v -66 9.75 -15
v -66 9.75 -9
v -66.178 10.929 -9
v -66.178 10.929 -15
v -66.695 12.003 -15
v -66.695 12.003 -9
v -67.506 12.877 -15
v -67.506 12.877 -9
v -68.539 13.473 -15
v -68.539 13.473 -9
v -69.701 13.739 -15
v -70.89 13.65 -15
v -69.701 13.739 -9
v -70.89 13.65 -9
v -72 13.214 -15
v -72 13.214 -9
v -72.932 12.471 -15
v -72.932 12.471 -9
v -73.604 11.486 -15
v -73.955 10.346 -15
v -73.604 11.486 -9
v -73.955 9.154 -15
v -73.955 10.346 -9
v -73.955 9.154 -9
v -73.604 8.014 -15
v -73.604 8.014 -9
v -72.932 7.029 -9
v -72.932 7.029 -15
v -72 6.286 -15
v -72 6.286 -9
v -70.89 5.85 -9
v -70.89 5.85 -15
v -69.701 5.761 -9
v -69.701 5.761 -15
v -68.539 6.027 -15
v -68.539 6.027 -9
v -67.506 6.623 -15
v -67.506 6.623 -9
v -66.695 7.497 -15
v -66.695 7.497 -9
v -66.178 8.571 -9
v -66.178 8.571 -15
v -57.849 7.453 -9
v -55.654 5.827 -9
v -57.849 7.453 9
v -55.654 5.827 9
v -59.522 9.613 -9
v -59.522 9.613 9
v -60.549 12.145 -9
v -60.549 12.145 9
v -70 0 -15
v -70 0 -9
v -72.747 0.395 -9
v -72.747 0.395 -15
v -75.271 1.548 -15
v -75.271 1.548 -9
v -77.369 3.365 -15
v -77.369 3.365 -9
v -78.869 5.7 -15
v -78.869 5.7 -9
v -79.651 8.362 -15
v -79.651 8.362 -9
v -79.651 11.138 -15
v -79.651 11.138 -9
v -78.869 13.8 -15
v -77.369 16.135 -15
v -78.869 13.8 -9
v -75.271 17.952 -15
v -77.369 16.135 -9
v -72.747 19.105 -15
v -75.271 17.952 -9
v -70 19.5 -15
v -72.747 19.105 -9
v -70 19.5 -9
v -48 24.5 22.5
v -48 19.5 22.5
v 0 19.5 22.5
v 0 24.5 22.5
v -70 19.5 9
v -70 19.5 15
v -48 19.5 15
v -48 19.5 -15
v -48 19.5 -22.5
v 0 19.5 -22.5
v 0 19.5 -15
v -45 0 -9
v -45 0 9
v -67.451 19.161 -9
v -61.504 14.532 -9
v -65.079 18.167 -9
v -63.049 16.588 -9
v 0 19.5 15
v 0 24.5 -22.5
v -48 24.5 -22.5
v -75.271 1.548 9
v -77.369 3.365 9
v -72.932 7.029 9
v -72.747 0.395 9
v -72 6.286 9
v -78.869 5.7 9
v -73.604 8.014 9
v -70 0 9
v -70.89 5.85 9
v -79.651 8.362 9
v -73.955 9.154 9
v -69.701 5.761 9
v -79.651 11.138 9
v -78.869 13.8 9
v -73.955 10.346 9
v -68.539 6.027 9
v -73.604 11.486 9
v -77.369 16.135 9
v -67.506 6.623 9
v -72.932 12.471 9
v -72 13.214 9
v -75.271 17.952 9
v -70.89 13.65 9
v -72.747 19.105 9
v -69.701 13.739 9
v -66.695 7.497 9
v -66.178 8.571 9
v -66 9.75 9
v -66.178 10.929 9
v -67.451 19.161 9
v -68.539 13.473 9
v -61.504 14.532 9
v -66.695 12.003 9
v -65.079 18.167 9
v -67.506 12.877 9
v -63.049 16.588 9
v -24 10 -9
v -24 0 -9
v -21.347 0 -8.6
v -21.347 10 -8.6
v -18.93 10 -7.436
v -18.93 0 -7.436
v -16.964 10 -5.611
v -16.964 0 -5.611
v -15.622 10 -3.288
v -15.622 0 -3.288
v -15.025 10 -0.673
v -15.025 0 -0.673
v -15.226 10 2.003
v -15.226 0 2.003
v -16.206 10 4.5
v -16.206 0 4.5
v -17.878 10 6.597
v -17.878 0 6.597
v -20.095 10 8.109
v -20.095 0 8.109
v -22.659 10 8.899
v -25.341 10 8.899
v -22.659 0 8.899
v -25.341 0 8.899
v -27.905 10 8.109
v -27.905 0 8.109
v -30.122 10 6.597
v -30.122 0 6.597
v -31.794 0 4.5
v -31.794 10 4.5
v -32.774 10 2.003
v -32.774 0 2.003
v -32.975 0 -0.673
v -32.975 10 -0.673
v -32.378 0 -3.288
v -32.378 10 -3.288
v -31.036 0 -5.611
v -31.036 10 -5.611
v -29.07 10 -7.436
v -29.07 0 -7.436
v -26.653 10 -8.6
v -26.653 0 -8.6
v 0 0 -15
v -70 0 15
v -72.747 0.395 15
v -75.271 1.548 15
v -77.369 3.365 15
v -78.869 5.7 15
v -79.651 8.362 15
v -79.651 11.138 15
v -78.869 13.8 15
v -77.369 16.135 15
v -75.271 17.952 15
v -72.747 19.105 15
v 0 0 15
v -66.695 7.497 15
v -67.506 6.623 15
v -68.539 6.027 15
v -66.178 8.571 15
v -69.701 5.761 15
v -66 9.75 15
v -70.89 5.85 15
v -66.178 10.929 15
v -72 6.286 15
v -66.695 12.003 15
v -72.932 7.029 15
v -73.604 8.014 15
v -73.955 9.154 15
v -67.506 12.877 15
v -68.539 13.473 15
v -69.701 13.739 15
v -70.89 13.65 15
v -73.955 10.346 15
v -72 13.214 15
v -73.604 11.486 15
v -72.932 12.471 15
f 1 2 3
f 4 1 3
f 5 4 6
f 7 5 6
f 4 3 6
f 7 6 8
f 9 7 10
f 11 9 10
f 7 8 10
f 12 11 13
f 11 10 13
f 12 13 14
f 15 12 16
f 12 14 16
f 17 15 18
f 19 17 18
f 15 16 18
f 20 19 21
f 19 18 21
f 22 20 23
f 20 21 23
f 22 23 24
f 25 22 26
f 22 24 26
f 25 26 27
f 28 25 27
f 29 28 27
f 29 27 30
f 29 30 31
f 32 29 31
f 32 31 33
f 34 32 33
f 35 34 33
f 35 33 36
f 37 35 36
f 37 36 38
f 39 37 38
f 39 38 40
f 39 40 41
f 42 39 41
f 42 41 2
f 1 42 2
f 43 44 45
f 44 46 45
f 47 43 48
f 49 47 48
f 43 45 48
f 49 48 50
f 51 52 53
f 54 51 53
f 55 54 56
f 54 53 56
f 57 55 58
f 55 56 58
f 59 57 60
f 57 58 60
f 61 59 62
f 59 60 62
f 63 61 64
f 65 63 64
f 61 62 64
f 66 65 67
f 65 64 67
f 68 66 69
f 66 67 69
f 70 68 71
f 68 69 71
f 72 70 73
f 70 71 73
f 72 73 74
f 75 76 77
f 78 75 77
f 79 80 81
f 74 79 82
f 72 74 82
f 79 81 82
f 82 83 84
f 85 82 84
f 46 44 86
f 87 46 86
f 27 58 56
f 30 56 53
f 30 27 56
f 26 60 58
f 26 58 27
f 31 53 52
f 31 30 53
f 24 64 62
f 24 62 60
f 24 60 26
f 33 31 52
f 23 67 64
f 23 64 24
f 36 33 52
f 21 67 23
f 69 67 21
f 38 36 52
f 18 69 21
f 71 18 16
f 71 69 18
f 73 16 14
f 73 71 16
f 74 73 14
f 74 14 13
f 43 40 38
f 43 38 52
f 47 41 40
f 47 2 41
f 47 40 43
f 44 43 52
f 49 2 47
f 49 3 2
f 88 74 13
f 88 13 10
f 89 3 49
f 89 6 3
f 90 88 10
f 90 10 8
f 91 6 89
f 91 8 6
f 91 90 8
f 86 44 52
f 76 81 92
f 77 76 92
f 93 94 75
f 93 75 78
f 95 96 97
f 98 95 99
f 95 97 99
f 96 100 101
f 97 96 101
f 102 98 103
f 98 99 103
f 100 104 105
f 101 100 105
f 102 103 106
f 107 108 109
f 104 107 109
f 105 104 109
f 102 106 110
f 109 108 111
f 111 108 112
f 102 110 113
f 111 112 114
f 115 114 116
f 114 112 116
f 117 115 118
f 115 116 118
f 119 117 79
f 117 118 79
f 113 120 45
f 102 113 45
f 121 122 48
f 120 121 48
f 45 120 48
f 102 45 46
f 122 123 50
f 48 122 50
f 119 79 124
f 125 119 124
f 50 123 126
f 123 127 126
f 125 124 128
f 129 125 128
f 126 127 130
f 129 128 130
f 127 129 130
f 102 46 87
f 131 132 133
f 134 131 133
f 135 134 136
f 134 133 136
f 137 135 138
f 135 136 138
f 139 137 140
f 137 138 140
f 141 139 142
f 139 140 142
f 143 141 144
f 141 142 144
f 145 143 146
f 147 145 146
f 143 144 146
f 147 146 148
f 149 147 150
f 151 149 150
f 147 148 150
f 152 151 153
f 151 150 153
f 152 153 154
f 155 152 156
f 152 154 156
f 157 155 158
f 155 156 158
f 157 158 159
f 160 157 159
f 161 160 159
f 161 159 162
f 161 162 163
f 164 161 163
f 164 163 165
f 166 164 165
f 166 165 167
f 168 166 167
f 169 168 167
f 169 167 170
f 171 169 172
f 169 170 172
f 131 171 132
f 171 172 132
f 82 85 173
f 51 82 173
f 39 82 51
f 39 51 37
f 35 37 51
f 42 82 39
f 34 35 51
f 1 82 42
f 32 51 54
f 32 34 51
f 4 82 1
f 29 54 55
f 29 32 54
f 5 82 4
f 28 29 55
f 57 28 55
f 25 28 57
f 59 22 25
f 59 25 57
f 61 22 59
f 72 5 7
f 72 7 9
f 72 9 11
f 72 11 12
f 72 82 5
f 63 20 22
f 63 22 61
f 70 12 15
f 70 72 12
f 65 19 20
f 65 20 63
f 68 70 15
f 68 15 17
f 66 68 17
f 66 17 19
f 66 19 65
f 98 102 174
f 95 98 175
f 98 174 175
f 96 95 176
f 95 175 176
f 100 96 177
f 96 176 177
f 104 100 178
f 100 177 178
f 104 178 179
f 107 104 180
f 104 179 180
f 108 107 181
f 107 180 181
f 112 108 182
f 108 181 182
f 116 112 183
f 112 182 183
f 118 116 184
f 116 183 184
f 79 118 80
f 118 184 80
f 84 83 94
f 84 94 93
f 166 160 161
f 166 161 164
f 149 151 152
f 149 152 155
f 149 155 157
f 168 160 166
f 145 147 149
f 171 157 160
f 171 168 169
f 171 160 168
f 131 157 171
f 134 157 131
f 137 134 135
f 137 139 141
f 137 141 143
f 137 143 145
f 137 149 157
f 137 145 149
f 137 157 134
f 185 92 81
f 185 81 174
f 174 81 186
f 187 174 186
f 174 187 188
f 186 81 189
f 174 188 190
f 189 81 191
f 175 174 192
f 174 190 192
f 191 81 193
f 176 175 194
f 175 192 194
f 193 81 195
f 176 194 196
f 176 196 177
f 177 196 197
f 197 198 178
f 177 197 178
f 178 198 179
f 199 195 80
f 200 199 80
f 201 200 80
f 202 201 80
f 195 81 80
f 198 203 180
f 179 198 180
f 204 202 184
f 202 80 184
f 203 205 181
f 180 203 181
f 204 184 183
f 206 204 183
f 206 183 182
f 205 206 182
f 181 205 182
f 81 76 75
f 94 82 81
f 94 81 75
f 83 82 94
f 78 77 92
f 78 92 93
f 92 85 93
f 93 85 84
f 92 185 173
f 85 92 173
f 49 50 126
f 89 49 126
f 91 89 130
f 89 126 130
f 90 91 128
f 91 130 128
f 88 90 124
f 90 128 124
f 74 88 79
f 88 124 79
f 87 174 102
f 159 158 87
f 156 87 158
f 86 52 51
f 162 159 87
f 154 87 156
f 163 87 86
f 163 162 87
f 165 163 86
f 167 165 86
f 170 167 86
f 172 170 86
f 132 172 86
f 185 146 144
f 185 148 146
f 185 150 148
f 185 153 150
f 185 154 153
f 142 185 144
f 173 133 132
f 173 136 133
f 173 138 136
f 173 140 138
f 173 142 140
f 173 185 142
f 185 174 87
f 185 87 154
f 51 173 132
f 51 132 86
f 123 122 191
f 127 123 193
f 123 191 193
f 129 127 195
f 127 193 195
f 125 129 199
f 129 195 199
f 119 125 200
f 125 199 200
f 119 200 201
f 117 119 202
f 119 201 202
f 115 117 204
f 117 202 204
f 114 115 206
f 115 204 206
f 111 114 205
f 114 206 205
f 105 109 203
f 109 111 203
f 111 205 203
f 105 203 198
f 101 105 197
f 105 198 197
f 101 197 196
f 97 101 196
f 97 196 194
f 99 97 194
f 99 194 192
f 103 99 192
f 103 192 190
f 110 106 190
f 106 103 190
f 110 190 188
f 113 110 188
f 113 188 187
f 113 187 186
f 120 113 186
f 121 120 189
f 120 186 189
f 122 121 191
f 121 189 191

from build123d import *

# Parameters (mm, degrees)
SKETCH1_W           = 30
SKETCH1_H           = 19.5
BOSS_EXTRUDE1_DEPTH = 70
BOSS_EXTRUDE2_DEPTH = 30
SKETCH7_W           = 48
SKETCH7_H           = 45
BOSS_EXTRUDE3_DEPTH = 5
CUT_EXTRUDE2_START  = -6
SKETCH8_R           = 9.75
CUT_EXTRUDE2_DEPTH  = 18
SKETCH9_R           = 4
CUT_EXTRUDE3_DEPTH  = 92.468915485
SKETCH10_R          = 9
CUT_EXTRUDE4_DEPTH  = 10
CUT_EXTRUDE6_START  = -6
CUT_EXTRUDE6_DEPTH  = 18
FILLET1_R           = 10


with BuildPart() as part:
    # Sketch1 → Boss-Extrude1 (new body)
    with BuildSketch(Plane(origin=(0, 0, 0), x_dir=(0, 0, -1), z_dir=(1, 0, 0))):
        with Locations((0, 9.75)):
            Rectangle(SKETCH1_W, SKETCH1_H)
    extrude(amount=-BOSS_EXTRUDE1_DEPTH)

    # Sketch6 → Boss-Extrude2 (add)
    with BuildSketch(Plane.XY.offset(15)):
        with BuildLine():
            Line((-70, 19.5), (-70, 0))
            ThreePointArc((-70, 0), (-79.75, 9.75), (-70, 19.5))
        make_face()
    extrude(amount=-BOSS_EXTRUDE2_DEPTH)

    # Sketch7 → Boss-Extrude3 (add)
    with BuildSketch(Plane(origin=(0, 19.5, 0), x_dir=(1, 0, 0), z_dir=(0, 1, 0))):
        with Locations((-24, 0)):
            Rectangle(SKETCH7_W, SKETCH7_H)
    extrude(amount=BOSS_EXTRUDE3_DEPTH)

    # Sketch8 → Cut-Extrude2 (cut)
    with BuildSketch(Plane.XY.offset(15).offset(CUT_EXTRUDE2_START)):
        with Locations((-70, 9.75)):
            Circle(SKETCH8_R)
    extrude(amount=-CUT_EXTRUDE2_DEPTH, mode=Mode.SUBTRACT)

    # Sketch9 → Cut-Extrude3 (cut, through all)
    with BuildSketch(Plane.XY.offset(15)):
        with Locations((-70, 9.75)):
            Circle(SKETCH9_R)
    extrude(amount=-CUT_EXTRUDE3_DEPTH, mode=Mode.SUBTRACT)

    # Sketch10 → Cut-Extrude4 (cut)
    with BuildSketch(Plane.XZ):
        with Locations(Location((-24, 0, 0), (0, 0, 270))):
            Circle(SKETCH10_R)
    extrude(amount=-CUT_EXTRUDE4_DEPTH, mode=Mode.SUBTRACT)

    # Sketch11 → Cut-Extrude6 (cut)
    with BuildSketch(Plane(origin=(0, 0, -15), x_dir=(-1, 0, 0), z_dir=(0, 0, -1)).offset(CUT_EXTRUDE6_START)):
        Polygon((66.561504355, 11.793709299), (45, 0), (70, 0), align=None)
    extrude(amount=-CUT_EXTRUDE6_DEPTH, mode=Mode.SUBTRACT)

    # Fillet1
    fillet1_edges = [part.edges().sort_by_distance(p)[0] for p in [
        (-60.344849532, 8.393324122, 0),
    ]]
    fillet(fillet1_edges, radius=FILLET1_R)


solid = part.part
